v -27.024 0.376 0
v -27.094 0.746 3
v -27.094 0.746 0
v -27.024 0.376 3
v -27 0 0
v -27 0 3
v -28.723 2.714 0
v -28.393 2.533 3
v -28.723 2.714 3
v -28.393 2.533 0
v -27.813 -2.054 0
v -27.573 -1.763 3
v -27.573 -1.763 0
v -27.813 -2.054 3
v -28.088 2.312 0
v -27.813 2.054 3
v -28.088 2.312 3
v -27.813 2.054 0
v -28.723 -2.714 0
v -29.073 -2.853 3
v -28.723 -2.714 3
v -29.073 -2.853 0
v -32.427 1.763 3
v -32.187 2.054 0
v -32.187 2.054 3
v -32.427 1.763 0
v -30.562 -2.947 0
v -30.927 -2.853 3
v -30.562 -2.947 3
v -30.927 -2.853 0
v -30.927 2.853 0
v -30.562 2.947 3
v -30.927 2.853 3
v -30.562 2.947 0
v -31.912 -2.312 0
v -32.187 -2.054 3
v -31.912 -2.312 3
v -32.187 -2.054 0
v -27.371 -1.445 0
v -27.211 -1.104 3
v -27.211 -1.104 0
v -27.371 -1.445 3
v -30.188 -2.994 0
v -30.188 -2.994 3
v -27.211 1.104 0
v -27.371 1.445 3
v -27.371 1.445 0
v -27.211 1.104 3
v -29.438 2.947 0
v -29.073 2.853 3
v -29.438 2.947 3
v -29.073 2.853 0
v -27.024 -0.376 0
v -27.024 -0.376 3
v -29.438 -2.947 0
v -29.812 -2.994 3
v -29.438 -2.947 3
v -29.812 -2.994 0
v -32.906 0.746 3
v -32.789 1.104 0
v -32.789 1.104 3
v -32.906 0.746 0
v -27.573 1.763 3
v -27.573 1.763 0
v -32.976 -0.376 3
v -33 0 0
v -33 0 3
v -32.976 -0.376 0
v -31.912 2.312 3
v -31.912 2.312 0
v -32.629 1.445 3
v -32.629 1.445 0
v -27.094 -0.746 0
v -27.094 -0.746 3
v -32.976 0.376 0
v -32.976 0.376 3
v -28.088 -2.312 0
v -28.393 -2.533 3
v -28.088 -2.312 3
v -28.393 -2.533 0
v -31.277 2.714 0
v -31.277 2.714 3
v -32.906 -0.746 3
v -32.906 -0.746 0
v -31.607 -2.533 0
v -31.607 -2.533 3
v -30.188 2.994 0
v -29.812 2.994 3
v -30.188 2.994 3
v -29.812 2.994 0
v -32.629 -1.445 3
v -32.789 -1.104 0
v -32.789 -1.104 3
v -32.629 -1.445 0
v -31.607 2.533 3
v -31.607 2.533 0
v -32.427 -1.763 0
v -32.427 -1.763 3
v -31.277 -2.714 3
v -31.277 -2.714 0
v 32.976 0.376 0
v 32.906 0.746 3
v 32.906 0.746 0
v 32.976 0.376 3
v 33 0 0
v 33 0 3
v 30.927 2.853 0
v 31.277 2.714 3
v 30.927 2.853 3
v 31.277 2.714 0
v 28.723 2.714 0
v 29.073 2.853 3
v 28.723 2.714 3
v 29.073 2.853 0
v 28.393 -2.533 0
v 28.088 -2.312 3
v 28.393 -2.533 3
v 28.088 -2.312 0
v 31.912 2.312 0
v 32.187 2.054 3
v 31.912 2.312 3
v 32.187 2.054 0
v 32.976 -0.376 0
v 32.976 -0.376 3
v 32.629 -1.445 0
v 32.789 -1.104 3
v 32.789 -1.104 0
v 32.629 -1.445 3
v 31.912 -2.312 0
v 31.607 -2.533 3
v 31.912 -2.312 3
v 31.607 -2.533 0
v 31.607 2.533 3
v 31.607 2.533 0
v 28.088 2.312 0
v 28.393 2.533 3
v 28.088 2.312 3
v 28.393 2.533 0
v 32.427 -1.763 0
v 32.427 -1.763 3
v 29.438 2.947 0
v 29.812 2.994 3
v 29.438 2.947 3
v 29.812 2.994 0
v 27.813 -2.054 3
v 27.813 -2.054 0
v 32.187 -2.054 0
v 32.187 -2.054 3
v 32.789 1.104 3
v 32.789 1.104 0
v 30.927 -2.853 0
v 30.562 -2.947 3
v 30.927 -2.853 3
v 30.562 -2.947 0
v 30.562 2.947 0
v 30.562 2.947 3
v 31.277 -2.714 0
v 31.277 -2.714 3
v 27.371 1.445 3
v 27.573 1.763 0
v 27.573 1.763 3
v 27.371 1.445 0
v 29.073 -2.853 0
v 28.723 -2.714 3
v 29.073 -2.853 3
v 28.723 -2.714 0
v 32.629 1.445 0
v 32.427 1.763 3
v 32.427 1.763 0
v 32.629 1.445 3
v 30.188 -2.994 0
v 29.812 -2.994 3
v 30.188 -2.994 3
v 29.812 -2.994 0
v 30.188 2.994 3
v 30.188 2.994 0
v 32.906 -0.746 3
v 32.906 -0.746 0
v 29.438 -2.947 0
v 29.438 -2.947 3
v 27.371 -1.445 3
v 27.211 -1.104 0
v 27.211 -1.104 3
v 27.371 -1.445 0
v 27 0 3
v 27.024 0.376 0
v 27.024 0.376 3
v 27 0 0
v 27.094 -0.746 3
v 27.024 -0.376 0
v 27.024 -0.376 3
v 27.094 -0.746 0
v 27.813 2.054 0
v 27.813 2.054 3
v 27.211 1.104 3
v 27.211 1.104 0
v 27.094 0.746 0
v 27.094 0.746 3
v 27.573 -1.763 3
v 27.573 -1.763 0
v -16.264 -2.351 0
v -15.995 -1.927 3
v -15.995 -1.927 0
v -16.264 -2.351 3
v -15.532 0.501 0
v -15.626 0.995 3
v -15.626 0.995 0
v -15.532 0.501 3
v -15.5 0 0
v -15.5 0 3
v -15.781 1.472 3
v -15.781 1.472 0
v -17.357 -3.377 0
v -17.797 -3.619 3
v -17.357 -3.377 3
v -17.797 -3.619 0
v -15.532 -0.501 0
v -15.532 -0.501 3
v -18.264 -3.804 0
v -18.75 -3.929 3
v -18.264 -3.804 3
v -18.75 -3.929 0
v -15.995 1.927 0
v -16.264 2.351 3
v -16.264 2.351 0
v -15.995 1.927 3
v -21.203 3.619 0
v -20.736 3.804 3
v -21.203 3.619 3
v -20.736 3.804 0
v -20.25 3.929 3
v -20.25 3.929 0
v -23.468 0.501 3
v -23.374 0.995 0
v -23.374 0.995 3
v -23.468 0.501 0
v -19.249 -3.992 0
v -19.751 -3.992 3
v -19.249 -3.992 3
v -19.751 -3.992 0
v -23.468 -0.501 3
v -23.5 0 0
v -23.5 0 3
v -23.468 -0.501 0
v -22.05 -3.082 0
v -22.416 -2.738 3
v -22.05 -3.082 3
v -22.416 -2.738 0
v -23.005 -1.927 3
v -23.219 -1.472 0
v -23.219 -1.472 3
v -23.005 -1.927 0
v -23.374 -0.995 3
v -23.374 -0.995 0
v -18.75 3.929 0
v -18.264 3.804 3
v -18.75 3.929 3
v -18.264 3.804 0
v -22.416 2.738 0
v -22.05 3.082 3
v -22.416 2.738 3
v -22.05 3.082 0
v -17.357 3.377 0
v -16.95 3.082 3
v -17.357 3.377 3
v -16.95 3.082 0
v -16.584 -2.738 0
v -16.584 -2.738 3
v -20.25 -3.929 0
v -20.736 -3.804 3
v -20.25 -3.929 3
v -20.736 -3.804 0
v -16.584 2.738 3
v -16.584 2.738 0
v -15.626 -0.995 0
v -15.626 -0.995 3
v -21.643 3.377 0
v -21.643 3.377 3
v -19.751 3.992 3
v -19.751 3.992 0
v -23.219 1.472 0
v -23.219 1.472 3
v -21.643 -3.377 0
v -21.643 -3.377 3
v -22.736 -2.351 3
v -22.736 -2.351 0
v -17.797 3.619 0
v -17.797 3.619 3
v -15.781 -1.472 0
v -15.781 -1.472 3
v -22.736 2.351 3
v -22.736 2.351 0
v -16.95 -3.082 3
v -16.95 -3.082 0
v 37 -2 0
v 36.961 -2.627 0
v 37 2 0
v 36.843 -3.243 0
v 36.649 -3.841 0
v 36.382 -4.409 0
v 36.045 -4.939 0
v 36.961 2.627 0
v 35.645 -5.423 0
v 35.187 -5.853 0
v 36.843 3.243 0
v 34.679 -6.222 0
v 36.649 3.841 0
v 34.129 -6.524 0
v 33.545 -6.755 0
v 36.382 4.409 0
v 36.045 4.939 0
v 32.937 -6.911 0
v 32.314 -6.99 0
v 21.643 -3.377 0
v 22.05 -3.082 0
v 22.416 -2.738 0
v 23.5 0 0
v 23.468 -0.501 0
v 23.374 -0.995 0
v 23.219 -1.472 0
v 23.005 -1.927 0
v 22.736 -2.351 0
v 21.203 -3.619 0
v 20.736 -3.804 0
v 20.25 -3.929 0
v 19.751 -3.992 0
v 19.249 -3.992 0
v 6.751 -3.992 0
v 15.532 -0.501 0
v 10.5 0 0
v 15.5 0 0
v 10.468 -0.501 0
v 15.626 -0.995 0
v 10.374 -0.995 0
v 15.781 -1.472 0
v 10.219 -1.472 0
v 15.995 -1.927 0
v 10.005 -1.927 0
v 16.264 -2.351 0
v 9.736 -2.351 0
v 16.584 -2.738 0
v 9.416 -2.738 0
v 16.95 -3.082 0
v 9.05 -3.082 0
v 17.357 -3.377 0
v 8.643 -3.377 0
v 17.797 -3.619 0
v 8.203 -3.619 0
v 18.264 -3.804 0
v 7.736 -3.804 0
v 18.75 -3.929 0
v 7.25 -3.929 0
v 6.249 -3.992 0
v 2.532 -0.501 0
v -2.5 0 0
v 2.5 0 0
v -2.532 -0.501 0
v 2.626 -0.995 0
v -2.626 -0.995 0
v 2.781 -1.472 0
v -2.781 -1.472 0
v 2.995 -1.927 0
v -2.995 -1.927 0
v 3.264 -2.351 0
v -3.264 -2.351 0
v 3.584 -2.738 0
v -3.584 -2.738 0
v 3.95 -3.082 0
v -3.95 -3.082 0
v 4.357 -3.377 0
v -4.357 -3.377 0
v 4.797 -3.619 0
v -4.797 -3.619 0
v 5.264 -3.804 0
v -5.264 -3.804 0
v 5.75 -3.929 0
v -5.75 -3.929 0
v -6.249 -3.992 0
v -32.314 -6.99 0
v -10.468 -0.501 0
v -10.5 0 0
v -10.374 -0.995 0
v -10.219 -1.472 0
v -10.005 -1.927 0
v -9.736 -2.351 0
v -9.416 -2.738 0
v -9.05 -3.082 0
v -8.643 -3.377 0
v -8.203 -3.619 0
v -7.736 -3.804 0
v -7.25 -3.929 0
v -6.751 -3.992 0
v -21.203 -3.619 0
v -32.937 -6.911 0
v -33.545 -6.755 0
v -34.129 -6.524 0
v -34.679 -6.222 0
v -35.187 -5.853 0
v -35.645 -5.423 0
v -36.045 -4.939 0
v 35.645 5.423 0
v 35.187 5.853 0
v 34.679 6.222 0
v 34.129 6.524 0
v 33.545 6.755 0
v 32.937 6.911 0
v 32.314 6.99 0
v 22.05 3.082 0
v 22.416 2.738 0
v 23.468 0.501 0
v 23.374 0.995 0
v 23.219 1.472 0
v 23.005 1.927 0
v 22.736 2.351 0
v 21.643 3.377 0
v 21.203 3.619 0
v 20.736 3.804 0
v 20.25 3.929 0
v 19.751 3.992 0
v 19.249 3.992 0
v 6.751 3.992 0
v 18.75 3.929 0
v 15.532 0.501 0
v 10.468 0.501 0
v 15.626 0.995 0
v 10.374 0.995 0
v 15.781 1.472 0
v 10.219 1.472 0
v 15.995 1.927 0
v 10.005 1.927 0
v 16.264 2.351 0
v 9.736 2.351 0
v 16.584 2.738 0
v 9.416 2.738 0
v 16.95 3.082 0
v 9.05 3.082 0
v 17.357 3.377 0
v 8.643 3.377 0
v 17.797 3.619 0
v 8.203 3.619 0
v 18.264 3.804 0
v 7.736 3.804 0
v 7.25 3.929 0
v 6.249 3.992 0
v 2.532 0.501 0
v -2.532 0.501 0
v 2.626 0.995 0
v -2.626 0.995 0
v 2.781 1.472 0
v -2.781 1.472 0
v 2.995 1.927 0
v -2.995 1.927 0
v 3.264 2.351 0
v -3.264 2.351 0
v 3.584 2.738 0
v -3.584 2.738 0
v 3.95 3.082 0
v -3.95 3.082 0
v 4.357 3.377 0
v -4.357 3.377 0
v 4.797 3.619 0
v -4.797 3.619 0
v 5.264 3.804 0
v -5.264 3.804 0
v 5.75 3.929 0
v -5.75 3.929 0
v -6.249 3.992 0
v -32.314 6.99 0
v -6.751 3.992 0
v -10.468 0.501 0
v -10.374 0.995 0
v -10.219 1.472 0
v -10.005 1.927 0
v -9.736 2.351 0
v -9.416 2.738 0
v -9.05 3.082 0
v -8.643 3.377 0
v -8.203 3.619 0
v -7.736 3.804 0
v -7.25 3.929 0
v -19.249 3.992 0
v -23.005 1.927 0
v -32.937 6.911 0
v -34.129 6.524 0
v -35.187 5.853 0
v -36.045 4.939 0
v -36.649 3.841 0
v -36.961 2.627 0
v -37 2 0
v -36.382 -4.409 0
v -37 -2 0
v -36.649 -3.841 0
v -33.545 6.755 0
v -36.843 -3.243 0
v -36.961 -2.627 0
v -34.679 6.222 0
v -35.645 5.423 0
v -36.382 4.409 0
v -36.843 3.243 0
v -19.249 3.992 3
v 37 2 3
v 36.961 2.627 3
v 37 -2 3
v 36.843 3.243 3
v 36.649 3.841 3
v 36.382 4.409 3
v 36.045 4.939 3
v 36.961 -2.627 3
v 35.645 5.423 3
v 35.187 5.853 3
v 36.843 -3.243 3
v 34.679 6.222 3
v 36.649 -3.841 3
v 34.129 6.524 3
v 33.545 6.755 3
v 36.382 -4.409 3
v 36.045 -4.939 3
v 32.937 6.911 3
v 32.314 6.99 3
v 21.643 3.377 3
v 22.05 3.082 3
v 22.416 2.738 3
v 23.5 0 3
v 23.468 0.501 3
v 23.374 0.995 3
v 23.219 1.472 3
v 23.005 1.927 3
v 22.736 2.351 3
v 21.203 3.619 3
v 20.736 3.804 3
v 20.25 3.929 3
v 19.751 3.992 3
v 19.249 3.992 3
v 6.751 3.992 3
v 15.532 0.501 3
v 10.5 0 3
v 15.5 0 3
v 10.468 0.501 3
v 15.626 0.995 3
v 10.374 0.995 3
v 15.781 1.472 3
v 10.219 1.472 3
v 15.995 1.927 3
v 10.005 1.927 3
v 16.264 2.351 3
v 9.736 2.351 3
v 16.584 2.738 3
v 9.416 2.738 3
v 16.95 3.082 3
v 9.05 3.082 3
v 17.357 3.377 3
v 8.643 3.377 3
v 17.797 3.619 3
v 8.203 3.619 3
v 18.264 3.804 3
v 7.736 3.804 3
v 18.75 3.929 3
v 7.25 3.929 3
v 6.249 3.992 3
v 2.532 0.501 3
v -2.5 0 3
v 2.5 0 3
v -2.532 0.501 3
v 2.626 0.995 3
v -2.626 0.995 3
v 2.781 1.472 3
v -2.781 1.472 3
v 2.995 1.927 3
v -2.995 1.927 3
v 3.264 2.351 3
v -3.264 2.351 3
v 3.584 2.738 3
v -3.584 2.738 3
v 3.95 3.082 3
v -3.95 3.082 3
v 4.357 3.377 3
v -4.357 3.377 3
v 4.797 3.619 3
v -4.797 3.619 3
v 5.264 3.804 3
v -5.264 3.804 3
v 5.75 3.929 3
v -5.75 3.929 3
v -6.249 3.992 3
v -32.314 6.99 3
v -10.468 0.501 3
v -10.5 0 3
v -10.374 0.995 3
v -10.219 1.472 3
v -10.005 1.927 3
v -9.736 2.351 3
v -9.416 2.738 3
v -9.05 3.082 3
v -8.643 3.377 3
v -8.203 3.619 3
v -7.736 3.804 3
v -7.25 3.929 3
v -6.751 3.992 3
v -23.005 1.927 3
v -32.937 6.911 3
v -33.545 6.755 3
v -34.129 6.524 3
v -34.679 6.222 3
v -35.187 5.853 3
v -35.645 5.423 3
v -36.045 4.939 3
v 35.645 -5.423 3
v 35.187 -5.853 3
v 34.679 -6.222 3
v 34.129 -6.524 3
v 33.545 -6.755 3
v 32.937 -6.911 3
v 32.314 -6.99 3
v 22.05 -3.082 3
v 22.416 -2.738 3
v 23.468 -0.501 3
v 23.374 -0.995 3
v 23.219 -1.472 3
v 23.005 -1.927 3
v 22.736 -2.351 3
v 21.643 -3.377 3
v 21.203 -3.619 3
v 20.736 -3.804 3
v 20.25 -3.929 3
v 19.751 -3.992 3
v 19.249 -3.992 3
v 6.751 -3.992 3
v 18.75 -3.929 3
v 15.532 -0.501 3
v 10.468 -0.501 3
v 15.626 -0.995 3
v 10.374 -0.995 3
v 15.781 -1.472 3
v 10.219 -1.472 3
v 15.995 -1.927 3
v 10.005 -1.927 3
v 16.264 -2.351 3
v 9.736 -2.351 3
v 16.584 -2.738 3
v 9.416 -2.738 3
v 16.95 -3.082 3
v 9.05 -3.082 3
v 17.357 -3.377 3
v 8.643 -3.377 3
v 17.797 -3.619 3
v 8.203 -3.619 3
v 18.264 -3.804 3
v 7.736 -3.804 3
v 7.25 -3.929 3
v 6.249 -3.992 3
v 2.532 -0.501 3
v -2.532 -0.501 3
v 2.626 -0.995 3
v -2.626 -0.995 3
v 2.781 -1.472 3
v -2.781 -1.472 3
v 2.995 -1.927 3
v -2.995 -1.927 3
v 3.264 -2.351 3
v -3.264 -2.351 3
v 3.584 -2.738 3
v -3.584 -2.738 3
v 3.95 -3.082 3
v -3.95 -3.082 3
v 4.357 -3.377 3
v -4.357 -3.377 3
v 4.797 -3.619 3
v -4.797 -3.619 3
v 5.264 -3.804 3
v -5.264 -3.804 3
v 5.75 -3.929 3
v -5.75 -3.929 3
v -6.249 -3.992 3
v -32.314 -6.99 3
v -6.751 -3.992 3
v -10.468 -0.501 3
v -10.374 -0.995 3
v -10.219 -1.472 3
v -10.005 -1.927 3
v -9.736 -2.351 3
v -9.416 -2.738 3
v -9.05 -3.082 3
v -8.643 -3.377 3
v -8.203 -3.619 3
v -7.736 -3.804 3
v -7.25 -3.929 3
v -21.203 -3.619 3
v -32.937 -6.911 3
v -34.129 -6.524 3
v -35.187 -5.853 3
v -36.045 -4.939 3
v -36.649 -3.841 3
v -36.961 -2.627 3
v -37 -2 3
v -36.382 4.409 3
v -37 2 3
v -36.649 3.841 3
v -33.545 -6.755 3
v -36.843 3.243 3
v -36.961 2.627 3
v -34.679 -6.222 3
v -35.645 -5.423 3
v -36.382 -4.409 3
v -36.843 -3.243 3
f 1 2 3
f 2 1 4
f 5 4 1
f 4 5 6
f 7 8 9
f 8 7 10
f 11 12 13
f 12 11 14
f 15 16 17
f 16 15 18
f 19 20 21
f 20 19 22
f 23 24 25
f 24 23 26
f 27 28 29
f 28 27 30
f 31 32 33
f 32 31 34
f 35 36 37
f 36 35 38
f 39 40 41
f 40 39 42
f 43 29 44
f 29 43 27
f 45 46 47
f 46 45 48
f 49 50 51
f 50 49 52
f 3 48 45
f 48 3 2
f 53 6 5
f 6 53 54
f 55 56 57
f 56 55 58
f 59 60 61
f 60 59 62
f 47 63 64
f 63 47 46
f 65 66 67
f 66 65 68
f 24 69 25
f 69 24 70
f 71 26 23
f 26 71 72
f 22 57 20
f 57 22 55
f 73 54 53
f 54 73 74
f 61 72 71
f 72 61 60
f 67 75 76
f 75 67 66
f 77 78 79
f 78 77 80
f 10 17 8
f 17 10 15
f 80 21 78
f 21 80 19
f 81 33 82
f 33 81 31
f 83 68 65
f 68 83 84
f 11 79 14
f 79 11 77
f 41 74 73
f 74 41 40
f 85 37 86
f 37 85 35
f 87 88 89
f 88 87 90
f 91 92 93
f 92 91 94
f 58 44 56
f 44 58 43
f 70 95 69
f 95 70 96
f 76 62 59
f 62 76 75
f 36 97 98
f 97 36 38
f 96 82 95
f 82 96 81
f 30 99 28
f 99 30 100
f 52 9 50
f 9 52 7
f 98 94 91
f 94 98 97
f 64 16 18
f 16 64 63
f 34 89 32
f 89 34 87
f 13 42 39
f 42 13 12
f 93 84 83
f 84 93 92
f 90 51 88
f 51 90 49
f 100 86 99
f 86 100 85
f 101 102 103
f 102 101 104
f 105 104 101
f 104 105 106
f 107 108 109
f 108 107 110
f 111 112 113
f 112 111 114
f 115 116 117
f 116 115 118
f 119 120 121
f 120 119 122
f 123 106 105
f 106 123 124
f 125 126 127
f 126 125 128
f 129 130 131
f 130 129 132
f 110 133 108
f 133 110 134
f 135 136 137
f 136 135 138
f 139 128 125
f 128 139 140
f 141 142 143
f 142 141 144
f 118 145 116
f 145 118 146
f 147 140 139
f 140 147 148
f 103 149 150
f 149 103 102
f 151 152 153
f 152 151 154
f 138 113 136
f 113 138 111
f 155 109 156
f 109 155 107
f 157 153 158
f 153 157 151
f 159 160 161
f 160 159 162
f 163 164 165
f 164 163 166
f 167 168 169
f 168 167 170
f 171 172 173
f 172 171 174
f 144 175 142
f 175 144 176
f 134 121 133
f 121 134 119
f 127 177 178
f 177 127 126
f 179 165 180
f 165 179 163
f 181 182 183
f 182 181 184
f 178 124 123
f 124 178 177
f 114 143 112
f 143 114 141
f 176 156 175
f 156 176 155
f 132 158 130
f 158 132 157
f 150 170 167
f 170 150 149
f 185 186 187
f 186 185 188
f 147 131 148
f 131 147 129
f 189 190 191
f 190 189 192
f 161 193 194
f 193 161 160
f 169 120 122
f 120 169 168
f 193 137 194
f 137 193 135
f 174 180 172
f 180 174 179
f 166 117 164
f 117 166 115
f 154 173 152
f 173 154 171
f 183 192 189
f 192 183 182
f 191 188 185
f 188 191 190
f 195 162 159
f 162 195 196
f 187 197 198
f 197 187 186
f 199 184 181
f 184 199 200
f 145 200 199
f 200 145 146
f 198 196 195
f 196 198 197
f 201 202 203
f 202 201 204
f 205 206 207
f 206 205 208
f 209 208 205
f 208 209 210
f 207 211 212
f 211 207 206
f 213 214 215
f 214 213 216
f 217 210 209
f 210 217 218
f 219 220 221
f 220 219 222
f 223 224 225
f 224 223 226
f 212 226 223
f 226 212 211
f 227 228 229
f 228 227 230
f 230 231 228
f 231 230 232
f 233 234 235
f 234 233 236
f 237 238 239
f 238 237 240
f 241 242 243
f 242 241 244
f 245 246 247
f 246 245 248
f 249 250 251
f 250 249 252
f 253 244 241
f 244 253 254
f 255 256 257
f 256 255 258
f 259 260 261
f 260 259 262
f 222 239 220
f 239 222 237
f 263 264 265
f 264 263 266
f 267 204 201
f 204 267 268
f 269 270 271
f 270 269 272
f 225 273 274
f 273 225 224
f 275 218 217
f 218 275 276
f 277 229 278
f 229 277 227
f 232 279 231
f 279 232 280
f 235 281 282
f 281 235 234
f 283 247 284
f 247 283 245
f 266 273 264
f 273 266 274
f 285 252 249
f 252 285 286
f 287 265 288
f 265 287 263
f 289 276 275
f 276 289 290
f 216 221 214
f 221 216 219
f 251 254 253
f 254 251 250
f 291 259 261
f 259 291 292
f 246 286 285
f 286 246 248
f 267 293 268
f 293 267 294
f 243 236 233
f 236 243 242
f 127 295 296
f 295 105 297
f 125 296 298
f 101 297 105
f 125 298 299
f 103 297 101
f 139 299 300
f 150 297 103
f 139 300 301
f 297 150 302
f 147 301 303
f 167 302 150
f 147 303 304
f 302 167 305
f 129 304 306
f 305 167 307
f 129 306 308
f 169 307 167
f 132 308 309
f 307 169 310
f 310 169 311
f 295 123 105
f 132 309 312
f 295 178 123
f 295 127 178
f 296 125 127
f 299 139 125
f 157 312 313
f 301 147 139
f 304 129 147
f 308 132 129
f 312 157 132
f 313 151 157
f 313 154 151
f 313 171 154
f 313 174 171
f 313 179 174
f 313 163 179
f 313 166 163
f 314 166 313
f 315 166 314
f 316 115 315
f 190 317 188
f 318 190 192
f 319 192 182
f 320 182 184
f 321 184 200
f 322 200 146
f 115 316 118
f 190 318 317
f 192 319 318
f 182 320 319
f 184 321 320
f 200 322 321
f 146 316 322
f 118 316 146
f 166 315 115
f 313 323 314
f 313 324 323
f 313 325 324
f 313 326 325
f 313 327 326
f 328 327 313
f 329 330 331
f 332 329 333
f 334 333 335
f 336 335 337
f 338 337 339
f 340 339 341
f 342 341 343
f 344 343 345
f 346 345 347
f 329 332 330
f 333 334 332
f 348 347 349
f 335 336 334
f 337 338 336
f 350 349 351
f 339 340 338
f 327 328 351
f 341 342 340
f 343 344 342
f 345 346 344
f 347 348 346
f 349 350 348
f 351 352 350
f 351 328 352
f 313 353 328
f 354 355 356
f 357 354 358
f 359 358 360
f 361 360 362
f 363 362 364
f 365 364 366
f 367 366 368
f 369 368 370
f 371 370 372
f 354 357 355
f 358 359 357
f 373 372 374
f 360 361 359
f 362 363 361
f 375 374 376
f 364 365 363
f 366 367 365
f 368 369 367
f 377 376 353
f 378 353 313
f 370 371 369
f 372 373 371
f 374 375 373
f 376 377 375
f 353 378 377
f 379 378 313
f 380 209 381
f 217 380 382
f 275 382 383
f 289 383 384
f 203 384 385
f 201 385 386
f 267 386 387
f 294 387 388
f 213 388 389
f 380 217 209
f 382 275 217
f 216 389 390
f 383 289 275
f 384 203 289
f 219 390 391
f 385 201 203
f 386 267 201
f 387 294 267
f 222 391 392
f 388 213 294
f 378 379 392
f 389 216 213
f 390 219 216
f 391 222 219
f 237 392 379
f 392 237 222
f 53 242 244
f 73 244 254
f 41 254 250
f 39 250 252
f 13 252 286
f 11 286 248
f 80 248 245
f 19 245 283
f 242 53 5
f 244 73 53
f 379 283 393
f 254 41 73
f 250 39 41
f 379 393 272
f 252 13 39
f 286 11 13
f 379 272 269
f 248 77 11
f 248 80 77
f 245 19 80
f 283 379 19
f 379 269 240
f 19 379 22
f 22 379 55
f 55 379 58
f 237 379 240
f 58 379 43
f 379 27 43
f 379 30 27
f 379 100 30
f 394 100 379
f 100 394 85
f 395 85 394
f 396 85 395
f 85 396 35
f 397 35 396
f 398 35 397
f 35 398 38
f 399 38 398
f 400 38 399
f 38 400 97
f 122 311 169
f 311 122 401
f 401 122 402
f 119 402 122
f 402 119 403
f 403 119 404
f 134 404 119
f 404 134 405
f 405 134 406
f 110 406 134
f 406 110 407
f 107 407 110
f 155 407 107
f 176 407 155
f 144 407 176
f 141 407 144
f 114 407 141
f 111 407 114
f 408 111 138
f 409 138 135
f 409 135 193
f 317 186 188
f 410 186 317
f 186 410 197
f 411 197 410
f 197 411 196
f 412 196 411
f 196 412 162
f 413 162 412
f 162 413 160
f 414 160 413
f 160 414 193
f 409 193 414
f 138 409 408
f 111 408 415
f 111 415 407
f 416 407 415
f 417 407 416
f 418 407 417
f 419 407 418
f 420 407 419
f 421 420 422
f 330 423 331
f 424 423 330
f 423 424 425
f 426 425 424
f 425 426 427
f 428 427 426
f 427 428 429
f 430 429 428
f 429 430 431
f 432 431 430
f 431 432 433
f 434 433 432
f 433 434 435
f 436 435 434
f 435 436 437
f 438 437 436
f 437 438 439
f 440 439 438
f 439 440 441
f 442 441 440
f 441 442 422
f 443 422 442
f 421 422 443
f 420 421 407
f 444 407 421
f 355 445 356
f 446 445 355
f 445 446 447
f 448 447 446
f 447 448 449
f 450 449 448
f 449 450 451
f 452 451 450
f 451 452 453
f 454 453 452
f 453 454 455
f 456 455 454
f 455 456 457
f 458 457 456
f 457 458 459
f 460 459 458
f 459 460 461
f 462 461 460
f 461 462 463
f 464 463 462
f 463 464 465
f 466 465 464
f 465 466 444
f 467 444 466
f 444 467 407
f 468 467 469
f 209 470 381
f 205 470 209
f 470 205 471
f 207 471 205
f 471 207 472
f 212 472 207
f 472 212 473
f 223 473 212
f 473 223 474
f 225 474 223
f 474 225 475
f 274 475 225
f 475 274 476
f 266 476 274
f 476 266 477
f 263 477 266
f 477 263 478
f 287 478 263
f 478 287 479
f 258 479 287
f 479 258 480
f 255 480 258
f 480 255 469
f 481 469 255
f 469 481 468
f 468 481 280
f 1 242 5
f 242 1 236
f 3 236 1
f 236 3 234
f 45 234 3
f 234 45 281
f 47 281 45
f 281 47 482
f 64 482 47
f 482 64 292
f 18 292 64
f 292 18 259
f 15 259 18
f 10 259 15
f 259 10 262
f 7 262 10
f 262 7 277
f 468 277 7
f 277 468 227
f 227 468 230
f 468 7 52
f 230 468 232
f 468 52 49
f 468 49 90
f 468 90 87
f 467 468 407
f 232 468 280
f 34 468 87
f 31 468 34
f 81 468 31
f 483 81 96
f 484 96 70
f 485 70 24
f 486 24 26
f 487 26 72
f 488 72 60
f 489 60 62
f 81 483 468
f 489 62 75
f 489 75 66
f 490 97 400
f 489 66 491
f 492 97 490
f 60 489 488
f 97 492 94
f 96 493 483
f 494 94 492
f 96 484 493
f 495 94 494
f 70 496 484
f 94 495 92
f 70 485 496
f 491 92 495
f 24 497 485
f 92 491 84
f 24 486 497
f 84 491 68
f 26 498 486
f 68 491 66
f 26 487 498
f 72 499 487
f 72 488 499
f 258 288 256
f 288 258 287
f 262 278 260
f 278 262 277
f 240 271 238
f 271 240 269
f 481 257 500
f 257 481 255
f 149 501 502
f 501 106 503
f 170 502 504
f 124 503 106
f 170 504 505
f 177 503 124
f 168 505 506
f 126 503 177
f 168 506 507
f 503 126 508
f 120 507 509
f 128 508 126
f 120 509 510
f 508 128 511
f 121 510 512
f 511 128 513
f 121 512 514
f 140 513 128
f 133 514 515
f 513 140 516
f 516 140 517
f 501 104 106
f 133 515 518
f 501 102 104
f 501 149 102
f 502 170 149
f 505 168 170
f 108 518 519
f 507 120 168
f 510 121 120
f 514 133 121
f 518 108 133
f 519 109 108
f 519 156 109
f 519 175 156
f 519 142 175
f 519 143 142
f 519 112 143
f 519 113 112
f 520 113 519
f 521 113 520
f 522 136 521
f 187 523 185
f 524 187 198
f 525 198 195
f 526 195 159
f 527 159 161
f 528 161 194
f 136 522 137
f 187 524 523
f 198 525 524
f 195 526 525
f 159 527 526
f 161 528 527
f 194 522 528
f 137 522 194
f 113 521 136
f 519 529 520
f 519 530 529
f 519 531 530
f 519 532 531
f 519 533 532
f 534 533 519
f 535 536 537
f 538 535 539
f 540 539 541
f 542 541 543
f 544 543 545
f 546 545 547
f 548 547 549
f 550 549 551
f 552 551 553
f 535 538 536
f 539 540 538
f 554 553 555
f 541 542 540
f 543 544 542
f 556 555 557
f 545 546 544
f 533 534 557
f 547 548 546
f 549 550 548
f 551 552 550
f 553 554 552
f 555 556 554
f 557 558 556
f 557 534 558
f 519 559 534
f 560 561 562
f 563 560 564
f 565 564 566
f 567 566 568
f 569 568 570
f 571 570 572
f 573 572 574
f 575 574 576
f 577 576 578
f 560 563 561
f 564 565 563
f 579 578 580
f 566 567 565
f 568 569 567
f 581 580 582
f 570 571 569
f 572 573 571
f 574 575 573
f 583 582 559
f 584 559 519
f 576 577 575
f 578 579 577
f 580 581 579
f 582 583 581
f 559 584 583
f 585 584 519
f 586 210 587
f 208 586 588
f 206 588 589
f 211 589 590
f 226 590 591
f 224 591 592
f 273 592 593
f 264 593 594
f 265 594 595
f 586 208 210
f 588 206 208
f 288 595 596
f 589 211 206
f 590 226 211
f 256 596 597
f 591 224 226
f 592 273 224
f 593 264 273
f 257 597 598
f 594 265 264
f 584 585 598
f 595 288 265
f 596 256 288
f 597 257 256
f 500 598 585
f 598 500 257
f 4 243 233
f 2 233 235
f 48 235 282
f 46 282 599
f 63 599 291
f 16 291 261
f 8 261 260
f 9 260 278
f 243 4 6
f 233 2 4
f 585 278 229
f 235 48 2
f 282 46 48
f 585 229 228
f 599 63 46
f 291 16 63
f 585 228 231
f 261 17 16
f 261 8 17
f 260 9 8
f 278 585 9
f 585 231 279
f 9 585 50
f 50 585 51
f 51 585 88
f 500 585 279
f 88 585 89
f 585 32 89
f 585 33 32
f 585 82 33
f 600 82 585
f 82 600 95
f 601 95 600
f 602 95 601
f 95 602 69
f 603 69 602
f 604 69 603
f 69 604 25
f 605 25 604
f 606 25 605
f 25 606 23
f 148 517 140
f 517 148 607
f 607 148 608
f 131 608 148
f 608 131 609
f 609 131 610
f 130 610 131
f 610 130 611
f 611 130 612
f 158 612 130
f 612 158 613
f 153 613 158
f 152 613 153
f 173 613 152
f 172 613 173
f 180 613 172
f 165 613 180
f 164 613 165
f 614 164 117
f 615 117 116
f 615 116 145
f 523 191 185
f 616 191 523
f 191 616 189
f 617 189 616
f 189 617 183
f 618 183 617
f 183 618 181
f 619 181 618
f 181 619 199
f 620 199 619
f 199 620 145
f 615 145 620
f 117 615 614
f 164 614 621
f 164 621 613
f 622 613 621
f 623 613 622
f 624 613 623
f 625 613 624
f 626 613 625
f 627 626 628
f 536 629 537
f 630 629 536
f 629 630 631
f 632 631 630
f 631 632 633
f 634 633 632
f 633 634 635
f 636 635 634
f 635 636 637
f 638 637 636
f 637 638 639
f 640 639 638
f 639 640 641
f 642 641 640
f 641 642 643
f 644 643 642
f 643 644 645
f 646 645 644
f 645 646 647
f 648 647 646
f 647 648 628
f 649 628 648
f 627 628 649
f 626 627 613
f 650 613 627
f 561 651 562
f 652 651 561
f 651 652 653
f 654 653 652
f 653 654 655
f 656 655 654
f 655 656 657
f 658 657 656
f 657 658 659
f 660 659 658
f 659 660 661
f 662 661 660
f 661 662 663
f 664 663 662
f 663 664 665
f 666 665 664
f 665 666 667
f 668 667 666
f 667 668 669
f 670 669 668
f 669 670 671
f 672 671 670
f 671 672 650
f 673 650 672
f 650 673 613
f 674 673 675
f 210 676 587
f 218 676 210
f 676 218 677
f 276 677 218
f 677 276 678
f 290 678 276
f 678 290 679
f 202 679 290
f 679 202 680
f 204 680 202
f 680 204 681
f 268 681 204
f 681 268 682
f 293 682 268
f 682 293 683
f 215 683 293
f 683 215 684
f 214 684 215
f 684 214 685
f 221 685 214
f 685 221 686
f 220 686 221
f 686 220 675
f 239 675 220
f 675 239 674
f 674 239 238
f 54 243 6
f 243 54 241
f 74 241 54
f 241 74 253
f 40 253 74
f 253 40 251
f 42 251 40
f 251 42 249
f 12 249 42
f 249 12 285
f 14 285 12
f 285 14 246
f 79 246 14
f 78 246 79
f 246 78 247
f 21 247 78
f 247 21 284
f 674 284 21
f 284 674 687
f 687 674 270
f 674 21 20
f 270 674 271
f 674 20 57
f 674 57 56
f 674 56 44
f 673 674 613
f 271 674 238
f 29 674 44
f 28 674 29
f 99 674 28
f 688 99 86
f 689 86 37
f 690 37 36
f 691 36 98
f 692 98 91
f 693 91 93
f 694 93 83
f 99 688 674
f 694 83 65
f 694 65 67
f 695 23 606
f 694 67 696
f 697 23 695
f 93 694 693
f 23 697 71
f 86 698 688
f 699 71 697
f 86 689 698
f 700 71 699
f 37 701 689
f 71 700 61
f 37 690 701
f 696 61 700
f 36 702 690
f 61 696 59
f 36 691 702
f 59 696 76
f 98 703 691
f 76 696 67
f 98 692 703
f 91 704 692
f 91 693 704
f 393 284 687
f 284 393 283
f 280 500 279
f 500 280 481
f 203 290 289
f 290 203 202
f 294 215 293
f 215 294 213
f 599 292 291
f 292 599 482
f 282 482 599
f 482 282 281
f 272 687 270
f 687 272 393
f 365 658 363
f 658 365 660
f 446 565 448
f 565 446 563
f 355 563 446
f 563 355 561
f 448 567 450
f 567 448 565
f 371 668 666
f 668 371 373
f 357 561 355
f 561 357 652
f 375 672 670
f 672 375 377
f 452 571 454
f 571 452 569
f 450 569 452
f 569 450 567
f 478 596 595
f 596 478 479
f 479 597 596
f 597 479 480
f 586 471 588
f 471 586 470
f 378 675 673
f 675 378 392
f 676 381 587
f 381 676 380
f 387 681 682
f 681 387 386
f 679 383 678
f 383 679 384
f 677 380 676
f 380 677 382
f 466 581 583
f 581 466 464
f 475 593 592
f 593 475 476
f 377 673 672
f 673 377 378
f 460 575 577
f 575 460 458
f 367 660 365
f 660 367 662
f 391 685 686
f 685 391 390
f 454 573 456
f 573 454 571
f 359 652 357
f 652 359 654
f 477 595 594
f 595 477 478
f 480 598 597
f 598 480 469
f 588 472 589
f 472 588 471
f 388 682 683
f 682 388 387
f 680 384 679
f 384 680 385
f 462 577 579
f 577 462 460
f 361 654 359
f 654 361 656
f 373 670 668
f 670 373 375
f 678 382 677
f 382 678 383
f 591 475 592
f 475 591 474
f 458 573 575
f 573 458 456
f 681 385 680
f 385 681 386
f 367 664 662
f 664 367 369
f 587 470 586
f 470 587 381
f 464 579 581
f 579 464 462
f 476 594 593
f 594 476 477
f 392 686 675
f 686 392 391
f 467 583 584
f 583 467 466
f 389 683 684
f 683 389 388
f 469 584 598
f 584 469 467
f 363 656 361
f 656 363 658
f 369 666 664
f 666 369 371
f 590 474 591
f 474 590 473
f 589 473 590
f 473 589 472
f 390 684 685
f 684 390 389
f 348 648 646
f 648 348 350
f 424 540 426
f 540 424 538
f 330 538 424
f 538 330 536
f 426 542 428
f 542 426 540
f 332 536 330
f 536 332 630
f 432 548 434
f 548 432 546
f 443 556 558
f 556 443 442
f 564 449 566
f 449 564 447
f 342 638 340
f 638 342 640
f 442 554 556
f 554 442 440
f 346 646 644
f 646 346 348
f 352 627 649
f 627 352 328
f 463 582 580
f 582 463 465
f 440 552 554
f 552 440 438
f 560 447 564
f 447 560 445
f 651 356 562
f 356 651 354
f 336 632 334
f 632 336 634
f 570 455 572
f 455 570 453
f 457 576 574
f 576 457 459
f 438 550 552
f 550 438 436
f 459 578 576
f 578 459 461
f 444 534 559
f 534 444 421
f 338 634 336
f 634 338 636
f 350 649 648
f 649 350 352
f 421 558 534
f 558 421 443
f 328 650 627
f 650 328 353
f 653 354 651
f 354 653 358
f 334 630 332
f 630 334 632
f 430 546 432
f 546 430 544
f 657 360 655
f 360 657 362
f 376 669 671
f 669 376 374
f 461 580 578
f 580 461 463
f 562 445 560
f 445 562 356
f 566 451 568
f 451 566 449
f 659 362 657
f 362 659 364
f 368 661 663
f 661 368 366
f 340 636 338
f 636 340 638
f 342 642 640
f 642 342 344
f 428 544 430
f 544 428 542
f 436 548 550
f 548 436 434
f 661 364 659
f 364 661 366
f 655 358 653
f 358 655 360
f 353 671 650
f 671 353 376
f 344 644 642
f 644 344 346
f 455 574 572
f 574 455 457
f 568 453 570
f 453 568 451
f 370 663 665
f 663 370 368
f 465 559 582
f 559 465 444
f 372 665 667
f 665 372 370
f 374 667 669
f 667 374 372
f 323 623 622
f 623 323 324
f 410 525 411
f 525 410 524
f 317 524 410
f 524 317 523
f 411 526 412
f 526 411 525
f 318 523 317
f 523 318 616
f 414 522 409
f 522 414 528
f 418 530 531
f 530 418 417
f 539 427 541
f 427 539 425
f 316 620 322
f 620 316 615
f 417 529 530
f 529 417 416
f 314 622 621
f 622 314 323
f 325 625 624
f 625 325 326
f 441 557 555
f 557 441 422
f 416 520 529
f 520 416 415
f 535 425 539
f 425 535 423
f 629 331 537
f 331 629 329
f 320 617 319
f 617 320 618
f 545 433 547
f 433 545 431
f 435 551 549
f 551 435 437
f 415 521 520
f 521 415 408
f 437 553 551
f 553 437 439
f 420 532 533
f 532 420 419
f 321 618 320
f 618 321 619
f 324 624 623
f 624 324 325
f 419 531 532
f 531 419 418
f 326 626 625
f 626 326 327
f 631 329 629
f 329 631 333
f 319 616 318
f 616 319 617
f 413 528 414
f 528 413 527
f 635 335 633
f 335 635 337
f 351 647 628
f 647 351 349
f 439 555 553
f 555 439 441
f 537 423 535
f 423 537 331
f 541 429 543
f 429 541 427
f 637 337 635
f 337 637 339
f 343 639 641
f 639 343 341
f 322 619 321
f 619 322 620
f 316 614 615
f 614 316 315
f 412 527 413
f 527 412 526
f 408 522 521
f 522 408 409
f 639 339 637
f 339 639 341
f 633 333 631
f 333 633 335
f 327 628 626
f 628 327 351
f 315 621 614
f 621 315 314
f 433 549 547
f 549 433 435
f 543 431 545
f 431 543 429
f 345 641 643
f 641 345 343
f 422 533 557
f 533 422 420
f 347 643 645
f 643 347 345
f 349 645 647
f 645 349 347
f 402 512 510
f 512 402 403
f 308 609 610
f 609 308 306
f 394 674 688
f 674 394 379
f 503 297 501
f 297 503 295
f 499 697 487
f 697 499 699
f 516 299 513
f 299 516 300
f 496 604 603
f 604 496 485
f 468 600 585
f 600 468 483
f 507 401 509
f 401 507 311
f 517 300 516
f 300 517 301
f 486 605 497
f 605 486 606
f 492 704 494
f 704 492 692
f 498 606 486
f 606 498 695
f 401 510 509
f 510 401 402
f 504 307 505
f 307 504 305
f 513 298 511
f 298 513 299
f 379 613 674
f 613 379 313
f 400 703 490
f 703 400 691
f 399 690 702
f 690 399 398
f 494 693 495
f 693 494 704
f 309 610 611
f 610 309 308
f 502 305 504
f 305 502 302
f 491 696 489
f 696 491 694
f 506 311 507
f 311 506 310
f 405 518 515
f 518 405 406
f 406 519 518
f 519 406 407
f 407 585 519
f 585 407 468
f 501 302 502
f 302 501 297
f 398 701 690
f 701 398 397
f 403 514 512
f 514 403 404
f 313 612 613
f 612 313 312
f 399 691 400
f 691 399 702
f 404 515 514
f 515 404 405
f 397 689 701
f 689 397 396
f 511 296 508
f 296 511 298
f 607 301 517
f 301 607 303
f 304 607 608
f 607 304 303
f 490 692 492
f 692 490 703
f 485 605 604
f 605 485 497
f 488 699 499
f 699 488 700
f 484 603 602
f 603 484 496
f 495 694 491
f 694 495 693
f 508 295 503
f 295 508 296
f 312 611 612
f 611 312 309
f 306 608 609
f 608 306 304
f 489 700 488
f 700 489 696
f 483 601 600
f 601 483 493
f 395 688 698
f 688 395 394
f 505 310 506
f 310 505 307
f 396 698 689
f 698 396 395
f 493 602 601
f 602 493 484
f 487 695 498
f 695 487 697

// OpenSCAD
$fn = 50;


difference() {
	union() {
		hull() {
			translate(v = [-32.0000000000, 2.0000000000, 0]) {
				cylinder(h = 3, r = 5);
			}
			translate(v = [32.0000000000, 2.0000000000, 0]) {
				cylinder(h = 3, r = 5);
			}
			translate(v = [-32.0000000000, -2.0000000000, 0]) {
				cylinder(h = 3, r = 5);
			}
			translate(v = [32.0000000000, -2.0000000000, 0]) {
				cylinder(h = 3, r = 5);
			}
		}
	}
	union() {
		#translate(v = [-30.0000000000, 0.0000000000, 0]) {
			cylinder(h = 3, r = 3.0000000000);
		}
		#translate(v = [30.0000000000, 0.0000000000, 0]) {
			cylinder(h = 3, r = 3.0000000000);
		}
		#translate(v = [-30.0000000000, 0.0000000000, -100.0000000000]) {
			cylinder(h = 200, r = 3.0000000000);
		}
		#translate(v = [-30.0000000000, 0.0000000000, -100.0000000000]) {
			cylinder(h = 200, r = 3.0000000000);
		}
		#translate(v = [30.0000000000, 0.0000000000, -100.0000000000]) {
			cylinder(h = 200, r = 3.0000000000);
		}
		#translate(v = [30.0000000000, 0.0000000000, -100.0000000000]) {
			cylinder(h = 200, r = 3.0000000000);
		}
		#translate(v = [-30.0000000000, 0.0000000000, 0]) {
			cylinder(h = 3, r = 1.5000000000);
		}
		#translate(v = [30.0000000000, 0.0000000000, 0]) {
			cylinder(h = 3, r = 1.5000000000);
		}
		#translate(v = [-30.0000000000, 0.0000000000, 0]) {
			cylinder(h = 3, r = 1.5000000000);
		}
		#translate(v = [30.0000000000, 0.0000000000, 0]) {
			cylinder(h = 3, r = 1.5000000000);
		}
		#translate(v = [-30.0000000000, 0.0000000000, 0]) {
			cylinder(h = 3, r = 1.5000000000);
		}
		#translate(v = [30.0000000000, 0.0000000000, 0]) {
			cylinder(h = 3, r = 1.5000000000);
		}
		#translate(v = [-19.5000000000, 0, 0]) {
			cylinder(h = 3, r = 4.0000000000);
		}
		#translate(v = [-6.5000000000, 0, 0]) {
			cylinder(h = 3, r = 4.0000000000);
		}
		#translate(v = [6.5000000000, 0, 0]) {
			cylinder(h = 3, r = 4.0000000000);
		}
		#translate(v = [19.5000000000, 0, 0]) {
			cylinder(h = 3, r = 4.0000000000);
		}
	}
}
